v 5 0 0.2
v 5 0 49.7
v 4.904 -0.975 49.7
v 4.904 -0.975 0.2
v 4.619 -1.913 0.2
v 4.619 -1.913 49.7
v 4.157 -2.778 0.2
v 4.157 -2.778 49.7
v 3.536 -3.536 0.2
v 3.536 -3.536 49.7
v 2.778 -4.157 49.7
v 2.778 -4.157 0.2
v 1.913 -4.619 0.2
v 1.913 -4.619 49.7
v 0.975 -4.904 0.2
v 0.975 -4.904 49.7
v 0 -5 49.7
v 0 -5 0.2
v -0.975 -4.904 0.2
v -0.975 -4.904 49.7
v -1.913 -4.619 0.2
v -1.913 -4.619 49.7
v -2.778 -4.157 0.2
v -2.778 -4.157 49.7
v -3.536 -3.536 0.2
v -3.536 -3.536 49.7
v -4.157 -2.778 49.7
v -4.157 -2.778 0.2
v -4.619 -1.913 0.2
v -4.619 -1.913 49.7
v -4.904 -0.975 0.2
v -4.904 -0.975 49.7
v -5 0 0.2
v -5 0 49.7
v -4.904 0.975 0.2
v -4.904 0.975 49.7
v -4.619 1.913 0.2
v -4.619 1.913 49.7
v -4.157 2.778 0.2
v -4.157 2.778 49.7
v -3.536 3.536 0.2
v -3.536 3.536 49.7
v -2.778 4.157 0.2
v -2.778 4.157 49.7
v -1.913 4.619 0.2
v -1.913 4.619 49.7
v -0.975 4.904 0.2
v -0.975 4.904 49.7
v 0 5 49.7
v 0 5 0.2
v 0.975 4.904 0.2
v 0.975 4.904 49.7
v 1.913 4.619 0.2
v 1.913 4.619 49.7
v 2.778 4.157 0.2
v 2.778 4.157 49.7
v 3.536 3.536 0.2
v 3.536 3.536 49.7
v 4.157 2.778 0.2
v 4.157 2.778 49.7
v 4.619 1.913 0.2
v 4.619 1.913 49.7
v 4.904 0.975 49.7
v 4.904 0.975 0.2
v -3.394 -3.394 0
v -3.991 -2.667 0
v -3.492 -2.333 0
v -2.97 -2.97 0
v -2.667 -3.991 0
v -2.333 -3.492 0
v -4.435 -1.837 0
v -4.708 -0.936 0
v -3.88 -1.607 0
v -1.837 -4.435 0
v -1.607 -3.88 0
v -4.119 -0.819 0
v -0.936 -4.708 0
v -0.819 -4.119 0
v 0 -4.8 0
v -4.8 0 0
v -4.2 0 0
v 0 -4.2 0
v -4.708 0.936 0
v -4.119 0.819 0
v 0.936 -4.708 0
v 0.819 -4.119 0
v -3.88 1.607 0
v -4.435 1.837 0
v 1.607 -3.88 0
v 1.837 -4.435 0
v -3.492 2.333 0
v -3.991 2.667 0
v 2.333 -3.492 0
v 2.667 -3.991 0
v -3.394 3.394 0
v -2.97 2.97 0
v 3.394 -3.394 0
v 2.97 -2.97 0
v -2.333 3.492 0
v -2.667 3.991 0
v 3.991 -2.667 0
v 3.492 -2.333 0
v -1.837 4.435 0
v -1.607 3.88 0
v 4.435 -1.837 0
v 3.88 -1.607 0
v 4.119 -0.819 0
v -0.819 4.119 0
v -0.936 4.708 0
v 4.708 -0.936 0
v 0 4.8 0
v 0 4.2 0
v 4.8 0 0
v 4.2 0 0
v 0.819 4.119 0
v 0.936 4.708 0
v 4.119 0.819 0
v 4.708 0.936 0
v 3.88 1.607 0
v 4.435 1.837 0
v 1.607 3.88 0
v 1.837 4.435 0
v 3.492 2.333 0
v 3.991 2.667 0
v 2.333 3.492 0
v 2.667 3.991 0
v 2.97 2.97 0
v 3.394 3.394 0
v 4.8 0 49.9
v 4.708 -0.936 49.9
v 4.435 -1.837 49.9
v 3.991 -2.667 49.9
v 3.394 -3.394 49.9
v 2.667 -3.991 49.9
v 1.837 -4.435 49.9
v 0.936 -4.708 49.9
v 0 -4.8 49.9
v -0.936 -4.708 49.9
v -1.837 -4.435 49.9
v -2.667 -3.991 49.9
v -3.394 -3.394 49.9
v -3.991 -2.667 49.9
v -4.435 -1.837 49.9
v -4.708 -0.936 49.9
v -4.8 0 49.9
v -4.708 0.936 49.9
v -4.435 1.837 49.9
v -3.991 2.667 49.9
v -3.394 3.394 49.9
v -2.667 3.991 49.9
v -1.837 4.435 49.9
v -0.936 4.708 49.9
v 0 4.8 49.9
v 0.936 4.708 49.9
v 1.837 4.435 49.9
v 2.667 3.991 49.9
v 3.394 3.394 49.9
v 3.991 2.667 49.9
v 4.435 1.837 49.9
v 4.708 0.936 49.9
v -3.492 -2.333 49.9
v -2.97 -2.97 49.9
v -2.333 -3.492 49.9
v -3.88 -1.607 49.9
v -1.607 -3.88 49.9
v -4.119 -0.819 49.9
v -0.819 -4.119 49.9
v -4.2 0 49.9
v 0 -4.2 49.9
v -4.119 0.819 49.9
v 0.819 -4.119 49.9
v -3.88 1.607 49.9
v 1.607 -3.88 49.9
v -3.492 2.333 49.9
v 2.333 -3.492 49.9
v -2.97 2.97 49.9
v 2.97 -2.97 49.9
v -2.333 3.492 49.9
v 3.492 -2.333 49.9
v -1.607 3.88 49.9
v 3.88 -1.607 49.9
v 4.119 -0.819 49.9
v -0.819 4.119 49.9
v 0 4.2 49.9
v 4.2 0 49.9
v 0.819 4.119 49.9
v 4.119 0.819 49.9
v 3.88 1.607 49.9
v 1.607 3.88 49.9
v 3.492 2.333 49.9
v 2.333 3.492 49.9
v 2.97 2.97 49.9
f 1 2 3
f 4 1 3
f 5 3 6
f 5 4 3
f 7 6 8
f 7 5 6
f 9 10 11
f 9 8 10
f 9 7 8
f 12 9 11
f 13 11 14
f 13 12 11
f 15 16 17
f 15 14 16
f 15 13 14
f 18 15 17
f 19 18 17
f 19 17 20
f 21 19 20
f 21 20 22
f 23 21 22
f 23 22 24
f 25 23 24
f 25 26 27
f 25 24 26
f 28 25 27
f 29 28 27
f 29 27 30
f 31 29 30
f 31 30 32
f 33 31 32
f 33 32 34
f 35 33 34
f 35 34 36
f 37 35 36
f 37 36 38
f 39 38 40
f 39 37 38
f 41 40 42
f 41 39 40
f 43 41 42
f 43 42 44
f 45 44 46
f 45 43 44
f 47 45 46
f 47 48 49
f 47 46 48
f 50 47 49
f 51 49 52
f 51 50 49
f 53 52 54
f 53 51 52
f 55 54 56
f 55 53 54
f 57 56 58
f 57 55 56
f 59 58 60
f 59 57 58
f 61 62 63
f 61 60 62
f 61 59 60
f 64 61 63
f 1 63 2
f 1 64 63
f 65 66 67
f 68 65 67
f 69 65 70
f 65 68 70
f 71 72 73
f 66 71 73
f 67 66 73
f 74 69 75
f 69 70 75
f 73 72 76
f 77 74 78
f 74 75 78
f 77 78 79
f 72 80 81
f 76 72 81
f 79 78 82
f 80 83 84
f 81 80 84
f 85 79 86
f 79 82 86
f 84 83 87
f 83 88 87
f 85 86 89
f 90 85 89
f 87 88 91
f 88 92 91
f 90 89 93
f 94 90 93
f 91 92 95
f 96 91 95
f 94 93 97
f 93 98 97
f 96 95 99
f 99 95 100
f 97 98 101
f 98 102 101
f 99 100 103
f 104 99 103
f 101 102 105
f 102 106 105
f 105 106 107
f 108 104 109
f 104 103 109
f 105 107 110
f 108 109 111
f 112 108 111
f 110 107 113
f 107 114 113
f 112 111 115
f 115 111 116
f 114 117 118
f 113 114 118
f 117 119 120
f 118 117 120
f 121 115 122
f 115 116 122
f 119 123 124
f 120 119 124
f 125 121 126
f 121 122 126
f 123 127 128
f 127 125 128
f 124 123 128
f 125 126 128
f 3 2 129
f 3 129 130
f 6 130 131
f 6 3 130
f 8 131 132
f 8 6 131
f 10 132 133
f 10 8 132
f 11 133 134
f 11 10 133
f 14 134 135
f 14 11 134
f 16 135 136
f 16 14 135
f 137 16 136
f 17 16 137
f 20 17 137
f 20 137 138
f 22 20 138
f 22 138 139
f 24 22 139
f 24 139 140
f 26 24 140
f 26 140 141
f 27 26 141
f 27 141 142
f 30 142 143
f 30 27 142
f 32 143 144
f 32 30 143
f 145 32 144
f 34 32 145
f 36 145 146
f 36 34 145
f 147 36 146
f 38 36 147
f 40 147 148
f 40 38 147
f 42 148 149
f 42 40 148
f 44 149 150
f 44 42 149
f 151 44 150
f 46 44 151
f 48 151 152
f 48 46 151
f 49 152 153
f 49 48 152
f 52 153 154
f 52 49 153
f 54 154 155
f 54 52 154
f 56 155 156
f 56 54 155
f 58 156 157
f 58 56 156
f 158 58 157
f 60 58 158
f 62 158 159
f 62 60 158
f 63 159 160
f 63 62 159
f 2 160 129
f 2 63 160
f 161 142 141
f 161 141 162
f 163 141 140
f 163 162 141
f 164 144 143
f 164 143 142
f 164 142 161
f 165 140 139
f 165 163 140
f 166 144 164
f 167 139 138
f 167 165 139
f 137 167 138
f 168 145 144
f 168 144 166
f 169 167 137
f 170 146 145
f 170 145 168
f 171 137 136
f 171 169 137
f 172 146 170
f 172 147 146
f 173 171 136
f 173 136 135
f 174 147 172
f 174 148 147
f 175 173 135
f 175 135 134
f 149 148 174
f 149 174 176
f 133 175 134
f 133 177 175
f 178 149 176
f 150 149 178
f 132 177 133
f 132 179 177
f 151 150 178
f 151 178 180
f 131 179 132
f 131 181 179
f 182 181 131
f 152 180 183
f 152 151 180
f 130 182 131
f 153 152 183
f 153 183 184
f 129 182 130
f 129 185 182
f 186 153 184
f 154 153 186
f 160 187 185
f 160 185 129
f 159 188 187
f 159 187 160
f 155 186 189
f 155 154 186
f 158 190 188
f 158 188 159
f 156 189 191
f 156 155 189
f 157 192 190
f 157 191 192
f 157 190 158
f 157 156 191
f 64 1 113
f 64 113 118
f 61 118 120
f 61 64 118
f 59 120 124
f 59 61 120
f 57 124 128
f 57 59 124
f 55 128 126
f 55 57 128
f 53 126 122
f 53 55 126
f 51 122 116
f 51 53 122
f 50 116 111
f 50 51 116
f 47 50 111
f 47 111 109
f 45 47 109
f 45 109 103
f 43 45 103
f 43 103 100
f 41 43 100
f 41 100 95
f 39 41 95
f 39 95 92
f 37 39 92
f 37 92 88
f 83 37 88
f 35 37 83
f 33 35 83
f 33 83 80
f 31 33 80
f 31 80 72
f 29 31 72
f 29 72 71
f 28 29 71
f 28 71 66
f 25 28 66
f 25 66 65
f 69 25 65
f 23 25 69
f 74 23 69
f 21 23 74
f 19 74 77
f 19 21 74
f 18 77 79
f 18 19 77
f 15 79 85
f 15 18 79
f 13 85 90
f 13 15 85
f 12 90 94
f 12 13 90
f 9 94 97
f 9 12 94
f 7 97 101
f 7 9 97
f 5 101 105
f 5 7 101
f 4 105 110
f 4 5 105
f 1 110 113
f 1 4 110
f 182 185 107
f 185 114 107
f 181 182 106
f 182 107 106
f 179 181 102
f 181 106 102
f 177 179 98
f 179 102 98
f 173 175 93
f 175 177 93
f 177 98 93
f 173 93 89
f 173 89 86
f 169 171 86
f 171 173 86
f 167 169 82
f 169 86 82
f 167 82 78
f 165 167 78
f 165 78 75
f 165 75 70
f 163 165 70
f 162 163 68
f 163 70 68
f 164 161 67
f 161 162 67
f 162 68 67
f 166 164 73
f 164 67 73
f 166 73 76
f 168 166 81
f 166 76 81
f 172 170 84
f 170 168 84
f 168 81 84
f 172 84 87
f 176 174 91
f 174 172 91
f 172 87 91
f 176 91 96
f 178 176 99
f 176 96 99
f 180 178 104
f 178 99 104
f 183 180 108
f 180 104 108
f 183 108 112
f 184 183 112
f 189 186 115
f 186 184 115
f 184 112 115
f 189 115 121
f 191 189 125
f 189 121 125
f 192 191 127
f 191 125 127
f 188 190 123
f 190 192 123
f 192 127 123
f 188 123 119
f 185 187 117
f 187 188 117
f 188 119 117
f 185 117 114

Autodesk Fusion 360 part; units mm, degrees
sketch "Esquisse1" plane through (0, 0, 0) normal (0, 0, 1) x (1, 0, 0)
  circle A0 centre (0, 0) radius 5
  circle A1 centre (0, 0) radius 4.2
  dimension "d1" = 10
  dimension "d2" = 8.4
extrude "Extrusion1" add sketch "Esquisse1" along normal blind 49.9
chamfer "Chanfrein1" distance 0.2 angle 45 1 edges at (-4.6616, -1.8081, 49.9)
chamfer "Chanfrein2" distance 0.2 angle 45 1 edges at (-4.6616, -1.8081, 0)
